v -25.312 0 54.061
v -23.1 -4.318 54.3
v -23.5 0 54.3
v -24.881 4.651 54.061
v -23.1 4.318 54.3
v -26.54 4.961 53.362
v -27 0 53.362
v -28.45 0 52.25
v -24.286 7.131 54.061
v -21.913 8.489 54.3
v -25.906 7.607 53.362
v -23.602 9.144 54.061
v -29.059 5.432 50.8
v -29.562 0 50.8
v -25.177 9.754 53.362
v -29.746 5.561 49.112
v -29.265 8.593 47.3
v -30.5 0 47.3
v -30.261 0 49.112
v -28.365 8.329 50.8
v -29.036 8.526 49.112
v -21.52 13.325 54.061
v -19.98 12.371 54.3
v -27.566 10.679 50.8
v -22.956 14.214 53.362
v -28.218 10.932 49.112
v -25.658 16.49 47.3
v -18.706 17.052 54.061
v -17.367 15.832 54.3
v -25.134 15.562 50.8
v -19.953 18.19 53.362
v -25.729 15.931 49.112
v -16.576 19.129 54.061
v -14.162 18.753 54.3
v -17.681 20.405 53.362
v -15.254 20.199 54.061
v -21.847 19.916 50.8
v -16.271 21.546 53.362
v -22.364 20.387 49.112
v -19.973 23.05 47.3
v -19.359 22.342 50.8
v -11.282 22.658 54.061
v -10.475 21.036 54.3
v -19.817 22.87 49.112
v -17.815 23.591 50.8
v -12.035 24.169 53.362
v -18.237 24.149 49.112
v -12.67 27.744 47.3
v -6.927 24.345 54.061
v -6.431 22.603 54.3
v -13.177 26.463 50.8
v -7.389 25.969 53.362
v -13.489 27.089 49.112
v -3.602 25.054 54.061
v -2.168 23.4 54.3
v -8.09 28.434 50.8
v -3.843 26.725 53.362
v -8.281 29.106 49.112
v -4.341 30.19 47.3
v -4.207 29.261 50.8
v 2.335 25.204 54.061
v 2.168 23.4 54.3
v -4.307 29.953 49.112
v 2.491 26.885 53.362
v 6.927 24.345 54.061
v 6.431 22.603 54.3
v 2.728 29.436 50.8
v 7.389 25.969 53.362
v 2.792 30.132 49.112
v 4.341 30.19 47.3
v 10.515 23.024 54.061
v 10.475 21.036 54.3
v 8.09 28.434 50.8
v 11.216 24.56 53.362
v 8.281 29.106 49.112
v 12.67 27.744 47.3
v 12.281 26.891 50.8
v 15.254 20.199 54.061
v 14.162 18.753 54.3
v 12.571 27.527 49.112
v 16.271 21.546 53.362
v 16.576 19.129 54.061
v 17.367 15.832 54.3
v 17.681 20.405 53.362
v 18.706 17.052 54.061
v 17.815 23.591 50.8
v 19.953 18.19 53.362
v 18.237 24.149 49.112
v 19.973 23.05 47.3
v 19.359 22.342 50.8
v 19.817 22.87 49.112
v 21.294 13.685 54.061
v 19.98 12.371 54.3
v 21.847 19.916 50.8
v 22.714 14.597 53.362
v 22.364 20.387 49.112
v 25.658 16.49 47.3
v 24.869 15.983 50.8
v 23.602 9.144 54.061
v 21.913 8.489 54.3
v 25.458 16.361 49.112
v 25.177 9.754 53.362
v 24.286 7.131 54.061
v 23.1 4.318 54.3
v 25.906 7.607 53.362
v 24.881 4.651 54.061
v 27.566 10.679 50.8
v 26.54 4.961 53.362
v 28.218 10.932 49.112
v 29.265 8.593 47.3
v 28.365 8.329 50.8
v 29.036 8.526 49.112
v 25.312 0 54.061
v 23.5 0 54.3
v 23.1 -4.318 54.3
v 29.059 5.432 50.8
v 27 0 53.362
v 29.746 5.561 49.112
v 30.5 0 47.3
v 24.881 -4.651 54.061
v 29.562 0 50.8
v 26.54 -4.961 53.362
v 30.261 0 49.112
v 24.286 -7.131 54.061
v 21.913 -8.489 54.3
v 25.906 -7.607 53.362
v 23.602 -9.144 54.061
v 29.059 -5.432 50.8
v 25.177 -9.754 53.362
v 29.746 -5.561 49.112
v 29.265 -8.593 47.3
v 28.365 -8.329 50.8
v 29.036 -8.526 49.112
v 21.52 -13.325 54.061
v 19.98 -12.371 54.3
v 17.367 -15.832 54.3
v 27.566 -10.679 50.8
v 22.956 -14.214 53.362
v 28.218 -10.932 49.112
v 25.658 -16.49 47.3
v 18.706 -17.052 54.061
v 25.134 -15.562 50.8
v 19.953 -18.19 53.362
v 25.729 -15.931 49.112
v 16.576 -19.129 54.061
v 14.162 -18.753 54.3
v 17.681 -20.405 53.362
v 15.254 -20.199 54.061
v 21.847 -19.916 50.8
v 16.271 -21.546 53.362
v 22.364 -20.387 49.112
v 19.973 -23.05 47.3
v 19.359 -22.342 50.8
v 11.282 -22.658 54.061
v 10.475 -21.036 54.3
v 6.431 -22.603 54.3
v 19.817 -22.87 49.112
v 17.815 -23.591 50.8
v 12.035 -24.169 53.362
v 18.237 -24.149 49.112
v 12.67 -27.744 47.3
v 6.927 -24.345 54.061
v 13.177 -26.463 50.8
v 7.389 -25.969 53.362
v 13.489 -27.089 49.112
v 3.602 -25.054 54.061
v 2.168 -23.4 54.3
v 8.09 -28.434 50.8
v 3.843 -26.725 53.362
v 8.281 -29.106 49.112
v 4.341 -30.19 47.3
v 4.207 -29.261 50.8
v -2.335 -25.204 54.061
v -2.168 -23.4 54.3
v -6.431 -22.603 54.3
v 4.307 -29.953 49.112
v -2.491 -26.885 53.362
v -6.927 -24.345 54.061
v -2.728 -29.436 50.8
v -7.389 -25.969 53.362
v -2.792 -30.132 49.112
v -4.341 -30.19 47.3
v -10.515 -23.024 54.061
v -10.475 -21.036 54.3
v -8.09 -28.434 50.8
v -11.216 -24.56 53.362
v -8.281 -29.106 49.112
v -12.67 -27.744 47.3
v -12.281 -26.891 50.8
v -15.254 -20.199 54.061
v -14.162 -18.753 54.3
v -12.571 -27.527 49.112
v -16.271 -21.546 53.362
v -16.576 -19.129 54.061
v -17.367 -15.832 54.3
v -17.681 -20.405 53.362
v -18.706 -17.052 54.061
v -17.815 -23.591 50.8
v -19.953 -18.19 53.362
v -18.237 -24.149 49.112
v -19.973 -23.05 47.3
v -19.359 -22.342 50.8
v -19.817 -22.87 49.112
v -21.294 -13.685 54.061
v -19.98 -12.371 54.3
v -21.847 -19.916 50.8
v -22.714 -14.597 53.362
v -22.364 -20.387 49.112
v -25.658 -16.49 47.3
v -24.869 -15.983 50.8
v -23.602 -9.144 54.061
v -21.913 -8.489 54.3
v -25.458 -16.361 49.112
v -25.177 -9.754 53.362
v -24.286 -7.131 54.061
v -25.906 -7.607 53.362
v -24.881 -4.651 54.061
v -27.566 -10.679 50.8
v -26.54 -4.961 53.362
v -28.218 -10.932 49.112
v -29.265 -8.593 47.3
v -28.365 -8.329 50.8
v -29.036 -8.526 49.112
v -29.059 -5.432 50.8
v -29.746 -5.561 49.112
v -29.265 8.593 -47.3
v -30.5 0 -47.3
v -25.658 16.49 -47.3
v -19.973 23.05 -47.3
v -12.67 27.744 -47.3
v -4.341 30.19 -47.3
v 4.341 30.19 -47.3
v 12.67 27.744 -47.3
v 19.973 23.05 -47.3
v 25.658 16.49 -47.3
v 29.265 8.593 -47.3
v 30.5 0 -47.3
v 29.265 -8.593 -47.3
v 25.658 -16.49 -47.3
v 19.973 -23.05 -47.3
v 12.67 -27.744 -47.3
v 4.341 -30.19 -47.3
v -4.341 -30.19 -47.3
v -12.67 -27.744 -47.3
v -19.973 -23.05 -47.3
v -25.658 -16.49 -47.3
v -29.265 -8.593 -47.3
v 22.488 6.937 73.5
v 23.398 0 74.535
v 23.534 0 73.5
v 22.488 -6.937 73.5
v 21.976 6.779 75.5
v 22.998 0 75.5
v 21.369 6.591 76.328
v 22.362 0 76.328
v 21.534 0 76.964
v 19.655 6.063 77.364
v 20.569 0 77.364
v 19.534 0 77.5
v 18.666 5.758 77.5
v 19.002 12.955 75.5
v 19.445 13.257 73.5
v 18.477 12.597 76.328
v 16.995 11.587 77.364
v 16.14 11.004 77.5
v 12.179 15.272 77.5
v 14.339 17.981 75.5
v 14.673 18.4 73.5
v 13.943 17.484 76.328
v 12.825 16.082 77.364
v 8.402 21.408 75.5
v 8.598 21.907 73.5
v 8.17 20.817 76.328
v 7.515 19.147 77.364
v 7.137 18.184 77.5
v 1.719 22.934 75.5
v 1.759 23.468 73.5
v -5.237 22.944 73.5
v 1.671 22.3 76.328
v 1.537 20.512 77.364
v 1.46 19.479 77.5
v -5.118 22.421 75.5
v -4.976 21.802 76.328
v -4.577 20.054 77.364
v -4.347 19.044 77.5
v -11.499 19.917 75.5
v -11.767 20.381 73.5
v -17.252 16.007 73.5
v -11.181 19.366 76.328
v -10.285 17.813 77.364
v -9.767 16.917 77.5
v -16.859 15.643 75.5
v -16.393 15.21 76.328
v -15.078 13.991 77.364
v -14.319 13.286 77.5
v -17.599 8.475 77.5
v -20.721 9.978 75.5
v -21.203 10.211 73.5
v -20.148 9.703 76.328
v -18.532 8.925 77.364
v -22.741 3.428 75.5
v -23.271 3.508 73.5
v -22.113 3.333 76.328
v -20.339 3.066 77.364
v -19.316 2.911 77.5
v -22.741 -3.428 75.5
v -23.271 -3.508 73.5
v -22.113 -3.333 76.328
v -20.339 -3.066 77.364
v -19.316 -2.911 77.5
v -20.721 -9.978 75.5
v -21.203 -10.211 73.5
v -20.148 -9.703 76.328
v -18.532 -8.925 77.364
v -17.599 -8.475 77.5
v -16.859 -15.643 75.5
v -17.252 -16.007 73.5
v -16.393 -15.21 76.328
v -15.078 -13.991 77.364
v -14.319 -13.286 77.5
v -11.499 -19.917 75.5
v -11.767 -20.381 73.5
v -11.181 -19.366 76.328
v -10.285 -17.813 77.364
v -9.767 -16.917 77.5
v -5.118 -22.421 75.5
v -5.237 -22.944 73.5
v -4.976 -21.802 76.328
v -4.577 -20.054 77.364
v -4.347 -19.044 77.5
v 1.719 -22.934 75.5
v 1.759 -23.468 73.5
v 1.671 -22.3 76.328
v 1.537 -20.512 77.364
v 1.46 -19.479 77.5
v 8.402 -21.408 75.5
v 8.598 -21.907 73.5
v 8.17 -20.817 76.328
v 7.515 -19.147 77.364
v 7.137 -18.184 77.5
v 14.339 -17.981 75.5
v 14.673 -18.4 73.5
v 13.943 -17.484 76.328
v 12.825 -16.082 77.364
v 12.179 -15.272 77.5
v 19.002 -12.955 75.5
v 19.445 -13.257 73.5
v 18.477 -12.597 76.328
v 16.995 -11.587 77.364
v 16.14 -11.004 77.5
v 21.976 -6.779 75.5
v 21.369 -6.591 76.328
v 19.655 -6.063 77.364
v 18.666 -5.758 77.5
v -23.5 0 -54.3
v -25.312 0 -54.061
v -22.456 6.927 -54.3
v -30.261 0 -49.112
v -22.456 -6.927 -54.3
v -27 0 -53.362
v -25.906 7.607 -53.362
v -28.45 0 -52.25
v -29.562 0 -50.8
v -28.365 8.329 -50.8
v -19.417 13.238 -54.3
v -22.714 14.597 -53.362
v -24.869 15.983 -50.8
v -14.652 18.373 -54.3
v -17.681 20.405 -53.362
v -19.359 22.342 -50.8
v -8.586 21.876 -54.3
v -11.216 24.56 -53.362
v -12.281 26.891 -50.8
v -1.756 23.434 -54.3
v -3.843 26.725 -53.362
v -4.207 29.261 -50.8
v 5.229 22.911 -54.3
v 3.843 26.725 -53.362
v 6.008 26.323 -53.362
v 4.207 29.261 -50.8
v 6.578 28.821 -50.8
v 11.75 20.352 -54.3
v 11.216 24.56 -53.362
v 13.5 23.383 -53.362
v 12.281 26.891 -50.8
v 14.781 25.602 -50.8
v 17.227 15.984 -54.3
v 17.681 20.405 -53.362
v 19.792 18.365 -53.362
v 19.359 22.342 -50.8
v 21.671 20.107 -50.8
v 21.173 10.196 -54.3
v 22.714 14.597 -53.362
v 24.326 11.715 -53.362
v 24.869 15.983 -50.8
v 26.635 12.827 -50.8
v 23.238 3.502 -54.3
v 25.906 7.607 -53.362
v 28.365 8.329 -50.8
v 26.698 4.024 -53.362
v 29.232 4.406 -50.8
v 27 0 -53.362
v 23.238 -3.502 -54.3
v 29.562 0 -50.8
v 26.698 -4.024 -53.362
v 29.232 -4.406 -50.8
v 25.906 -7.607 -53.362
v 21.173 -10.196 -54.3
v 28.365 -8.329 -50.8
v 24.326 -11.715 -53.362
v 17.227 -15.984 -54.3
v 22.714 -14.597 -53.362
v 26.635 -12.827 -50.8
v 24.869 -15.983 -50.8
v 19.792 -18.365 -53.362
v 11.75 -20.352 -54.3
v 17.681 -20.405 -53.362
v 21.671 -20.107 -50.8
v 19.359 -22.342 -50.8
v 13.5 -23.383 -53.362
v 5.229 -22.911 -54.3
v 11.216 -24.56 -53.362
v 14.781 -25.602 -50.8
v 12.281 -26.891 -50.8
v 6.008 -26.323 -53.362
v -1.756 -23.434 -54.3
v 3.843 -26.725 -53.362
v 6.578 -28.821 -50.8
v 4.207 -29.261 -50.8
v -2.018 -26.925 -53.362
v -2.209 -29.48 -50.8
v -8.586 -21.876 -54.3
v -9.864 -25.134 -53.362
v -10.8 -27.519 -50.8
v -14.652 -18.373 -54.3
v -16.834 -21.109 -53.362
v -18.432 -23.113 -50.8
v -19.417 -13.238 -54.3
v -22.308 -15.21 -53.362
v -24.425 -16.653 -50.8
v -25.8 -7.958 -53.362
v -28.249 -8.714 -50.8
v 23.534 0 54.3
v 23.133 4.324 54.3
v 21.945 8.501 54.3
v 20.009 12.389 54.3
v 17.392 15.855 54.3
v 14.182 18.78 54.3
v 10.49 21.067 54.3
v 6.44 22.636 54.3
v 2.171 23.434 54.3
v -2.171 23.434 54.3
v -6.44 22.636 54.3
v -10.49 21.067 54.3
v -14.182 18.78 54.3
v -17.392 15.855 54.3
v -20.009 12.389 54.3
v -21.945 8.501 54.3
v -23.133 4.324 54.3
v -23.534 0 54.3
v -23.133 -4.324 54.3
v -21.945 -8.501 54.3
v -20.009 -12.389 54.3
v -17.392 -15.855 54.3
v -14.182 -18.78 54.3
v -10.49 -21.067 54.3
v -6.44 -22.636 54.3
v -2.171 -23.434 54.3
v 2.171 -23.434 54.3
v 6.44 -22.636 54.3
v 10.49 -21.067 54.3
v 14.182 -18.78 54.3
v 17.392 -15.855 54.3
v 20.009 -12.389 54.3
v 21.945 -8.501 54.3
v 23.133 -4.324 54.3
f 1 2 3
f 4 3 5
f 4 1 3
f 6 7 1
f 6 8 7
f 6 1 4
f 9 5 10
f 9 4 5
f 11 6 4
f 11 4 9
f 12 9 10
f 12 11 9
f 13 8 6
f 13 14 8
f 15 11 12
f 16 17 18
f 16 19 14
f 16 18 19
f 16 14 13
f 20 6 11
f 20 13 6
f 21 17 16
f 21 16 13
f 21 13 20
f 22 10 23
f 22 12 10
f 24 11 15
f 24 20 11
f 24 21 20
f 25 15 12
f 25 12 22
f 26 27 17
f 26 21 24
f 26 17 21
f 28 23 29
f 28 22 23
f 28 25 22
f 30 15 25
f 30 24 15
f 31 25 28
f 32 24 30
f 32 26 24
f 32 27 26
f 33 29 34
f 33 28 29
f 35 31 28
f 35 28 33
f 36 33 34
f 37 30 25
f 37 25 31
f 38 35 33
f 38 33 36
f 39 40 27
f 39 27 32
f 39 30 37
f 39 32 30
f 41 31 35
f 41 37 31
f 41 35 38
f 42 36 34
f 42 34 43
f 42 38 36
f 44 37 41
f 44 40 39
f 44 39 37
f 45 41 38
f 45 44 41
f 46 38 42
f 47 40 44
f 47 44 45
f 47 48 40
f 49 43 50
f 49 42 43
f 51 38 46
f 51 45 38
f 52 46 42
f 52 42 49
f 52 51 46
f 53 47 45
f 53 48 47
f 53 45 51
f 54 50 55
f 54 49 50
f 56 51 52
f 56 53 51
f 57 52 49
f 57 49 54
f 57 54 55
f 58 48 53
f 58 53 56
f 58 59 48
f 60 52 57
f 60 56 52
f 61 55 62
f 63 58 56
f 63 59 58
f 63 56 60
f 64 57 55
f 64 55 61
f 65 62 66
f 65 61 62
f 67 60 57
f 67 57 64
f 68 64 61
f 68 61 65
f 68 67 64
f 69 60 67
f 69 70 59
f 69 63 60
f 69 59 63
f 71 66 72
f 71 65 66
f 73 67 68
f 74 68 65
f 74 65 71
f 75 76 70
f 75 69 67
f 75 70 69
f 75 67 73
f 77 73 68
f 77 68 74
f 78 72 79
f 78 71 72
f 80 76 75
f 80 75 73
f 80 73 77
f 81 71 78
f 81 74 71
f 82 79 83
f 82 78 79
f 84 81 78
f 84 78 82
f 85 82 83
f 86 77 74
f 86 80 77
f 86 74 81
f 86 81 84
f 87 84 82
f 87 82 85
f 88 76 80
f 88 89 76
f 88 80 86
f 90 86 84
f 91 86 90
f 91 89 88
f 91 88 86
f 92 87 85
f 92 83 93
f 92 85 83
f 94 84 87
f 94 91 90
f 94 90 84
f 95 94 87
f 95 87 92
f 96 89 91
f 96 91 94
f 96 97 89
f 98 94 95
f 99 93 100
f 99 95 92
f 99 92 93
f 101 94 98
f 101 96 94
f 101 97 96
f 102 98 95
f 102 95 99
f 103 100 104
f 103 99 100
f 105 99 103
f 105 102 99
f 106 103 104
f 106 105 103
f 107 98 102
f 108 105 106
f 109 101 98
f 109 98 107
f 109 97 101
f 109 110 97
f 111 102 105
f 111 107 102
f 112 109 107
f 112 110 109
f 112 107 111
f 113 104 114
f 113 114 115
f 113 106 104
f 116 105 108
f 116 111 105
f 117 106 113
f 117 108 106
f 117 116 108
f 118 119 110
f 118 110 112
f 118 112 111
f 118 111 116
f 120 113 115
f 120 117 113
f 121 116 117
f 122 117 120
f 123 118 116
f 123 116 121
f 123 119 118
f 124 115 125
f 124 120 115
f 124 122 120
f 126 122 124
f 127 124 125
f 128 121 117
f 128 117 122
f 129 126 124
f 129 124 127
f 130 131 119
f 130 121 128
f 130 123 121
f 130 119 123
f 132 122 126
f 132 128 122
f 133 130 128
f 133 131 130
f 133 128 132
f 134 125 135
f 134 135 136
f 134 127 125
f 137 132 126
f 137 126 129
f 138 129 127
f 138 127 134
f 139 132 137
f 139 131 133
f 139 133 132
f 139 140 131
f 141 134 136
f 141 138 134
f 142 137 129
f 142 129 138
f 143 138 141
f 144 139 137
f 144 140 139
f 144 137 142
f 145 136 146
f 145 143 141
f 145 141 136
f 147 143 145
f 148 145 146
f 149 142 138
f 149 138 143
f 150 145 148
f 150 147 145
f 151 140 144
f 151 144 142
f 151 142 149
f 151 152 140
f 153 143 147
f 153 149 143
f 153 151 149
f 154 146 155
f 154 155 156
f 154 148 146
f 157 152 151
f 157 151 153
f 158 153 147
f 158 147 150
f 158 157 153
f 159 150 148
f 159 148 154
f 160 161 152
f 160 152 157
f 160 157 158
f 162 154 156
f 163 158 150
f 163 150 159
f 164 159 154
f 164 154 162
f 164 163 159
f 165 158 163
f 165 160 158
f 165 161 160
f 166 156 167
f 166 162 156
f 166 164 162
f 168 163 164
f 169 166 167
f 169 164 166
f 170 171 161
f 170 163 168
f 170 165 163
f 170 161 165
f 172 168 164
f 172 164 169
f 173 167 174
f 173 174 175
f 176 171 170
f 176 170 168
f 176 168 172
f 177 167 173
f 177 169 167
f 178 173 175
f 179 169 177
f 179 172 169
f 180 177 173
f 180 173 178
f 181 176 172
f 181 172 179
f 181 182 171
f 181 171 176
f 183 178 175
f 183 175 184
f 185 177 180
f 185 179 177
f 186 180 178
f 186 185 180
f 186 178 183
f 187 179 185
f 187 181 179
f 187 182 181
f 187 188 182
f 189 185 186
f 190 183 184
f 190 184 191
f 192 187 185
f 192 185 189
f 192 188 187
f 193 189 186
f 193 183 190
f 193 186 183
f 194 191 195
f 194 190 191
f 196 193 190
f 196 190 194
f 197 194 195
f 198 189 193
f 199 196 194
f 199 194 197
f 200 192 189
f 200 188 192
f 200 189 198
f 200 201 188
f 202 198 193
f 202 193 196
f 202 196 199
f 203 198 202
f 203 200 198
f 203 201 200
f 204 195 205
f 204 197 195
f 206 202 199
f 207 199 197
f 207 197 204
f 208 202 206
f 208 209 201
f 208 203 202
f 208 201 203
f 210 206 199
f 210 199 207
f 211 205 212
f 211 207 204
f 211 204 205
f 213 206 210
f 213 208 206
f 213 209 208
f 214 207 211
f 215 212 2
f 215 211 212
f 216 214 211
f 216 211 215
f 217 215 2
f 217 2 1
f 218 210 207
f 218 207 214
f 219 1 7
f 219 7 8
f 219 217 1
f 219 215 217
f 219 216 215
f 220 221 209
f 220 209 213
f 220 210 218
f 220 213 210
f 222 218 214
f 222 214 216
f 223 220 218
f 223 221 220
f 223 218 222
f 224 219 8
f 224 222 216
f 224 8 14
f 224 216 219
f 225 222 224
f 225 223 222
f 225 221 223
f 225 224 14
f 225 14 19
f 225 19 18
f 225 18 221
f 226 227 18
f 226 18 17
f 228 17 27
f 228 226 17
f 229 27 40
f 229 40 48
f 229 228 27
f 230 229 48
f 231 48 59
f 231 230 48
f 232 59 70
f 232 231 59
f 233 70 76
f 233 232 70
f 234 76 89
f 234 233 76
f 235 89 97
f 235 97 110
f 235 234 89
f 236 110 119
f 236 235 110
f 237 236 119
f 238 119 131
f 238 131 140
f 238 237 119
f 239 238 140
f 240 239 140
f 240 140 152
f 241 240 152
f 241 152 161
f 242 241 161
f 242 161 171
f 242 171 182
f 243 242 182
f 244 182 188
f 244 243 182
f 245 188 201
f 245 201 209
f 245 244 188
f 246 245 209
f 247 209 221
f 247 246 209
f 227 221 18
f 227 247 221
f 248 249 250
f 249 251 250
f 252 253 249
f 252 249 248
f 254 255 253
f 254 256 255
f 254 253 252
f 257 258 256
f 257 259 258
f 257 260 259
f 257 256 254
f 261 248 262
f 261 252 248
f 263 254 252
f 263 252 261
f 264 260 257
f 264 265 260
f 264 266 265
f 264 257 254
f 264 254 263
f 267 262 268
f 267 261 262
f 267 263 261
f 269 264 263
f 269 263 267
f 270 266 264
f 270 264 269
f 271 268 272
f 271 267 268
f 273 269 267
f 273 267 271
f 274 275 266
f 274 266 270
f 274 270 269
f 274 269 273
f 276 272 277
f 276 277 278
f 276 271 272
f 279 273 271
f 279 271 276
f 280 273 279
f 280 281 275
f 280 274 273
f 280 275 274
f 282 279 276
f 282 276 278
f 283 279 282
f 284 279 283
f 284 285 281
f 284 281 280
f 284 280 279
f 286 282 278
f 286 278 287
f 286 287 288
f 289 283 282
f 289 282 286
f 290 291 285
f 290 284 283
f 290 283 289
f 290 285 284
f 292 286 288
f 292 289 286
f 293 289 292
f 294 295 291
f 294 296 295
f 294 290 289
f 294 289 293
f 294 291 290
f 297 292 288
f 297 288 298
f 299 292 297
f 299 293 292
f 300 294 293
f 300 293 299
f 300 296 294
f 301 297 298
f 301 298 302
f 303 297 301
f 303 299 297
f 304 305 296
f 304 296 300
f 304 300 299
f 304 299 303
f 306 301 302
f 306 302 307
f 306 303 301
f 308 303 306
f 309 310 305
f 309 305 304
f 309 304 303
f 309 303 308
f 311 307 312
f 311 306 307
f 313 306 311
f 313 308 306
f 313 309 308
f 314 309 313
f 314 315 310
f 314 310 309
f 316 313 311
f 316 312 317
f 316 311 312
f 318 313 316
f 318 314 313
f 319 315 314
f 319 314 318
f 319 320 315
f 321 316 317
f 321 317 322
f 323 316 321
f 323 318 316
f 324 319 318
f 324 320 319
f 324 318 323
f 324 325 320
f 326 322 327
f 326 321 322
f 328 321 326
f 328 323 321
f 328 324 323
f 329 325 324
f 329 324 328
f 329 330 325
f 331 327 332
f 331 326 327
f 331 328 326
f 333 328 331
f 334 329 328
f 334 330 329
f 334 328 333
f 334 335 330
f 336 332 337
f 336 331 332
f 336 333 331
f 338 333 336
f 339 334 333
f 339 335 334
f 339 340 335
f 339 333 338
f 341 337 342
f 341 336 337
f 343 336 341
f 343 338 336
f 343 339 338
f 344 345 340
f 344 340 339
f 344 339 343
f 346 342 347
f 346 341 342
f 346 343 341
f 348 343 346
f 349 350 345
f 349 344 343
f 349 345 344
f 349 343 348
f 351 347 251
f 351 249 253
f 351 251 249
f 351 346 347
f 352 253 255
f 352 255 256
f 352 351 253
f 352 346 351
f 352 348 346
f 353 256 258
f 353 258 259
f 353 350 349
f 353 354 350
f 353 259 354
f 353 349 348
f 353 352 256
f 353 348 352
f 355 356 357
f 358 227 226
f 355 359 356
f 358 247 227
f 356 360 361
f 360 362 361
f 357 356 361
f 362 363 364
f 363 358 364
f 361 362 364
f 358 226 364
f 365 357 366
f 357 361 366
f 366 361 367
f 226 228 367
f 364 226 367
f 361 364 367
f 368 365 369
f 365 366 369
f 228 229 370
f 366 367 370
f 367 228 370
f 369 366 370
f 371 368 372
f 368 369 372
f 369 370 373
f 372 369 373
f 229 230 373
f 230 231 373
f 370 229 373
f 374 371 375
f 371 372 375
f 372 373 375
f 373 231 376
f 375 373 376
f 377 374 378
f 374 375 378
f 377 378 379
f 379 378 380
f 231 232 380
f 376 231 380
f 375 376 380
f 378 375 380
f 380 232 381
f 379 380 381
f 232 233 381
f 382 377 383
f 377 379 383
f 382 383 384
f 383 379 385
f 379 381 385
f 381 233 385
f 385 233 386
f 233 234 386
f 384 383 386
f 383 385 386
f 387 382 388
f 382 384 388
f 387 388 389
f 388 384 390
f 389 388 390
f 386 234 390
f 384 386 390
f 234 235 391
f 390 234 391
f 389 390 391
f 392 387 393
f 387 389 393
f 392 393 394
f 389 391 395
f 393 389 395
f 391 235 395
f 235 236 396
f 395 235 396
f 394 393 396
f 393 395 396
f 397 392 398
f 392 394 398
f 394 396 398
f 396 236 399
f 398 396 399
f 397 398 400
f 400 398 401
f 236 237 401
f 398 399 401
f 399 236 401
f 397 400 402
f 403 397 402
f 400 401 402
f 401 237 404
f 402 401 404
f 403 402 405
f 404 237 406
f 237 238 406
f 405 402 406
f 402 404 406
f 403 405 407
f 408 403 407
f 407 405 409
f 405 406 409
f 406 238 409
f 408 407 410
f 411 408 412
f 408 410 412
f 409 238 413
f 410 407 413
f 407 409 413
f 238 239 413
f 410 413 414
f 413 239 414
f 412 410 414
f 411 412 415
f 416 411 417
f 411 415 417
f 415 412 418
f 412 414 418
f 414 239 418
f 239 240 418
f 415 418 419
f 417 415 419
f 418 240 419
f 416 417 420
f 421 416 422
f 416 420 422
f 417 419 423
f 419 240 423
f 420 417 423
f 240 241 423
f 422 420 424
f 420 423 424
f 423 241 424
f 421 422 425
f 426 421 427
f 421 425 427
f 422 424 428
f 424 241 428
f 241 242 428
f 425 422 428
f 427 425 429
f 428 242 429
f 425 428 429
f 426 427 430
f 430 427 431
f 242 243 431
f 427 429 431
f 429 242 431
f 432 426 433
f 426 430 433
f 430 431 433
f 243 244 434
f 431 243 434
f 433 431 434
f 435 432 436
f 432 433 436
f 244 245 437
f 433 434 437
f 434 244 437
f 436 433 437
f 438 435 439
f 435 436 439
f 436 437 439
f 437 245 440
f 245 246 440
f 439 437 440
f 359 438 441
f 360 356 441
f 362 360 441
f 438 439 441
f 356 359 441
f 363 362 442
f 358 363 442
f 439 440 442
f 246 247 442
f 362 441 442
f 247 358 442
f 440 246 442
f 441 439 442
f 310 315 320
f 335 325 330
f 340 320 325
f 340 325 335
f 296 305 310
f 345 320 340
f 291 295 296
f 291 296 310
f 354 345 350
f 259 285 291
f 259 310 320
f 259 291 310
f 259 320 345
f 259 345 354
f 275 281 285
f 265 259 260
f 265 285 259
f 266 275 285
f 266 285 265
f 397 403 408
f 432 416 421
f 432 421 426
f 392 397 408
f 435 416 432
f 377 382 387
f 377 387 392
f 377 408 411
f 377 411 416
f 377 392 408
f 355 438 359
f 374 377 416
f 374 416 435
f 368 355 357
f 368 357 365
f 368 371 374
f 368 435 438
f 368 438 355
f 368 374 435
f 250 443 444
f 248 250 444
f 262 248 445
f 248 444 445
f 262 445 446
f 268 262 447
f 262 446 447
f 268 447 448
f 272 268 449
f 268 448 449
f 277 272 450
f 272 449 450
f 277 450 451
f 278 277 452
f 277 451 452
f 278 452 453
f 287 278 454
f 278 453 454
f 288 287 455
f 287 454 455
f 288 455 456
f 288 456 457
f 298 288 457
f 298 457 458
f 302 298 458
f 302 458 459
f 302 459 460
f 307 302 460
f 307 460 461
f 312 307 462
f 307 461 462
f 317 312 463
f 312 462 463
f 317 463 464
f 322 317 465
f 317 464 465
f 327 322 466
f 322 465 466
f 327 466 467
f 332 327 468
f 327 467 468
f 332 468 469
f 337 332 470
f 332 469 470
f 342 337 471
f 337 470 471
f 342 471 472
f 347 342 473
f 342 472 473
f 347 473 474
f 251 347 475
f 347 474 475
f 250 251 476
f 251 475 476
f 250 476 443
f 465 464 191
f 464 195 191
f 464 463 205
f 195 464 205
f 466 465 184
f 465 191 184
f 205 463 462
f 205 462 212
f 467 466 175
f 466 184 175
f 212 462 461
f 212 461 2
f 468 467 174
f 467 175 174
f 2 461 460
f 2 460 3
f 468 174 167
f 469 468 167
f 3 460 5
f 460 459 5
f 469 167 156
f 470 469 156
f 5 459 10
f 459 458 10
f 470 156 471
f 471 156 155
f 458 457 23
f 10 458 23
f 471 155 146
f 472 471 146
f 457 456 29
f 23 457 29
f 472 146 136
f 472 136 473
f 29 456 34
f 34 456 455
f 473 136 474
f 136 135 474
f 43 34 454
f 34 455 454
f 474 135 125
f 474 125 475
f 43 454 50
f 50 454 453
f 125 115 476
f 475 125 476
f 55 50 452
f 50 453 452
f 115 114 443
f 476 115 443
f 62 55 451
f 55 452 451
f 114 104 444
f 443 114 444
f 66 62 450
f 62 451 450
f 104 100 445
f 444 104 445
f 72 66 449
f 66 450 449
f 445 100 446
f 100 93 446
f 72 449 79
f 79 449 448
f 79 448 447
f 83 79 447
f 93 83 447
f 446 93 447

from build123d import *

# Parameters (mm, degrees)
F2_R     = 7
F3_R     = 23.533943
F4_DEPTH = 23.2
F5_R     = 4


with BuildPart() as f1:
    # F0 (on Front) → F1 (revolve)
    with BuildSketch(Plane.XZ):
        with BuildLine():
            Line((-30.5, -54.3), (0, -54.3))
            Line((0, -54.3), (0, 54.3))
            Line((0, 54.3), (-23.5, 54.3))
            ThreePointArc((-23.5, 54.3), (-28.449747, 52.249747), (-30.5, 47.3))
            Line((-30.5, 47.3), (-30.5, -54.3))
        make_face()
    revolve(axis=Axis((0, 0, 0), (0, 0, -1)))

    # F2
    f2_edges = [f1.edges().sort_by_distance(p)[0] for p in [
        (30.5, 0, -54.3),
    ]]
    fillet(f2_edges, radius=F2_R)

    # F3 (on face) → F4 (join)
    with BuildSketch(Plane.XY.offset(54.3)):
        Circle(F3_R)
    extrude(amount=F4_DEPTH)

    # F5
    f5_edges = [f1.edges().sort_by_distance(p)[0] for p in [
        (-23.533943, 0, 77.5),
    ]]
    fillet(f5_edges, radius=F5_R)


solid = f1.part
